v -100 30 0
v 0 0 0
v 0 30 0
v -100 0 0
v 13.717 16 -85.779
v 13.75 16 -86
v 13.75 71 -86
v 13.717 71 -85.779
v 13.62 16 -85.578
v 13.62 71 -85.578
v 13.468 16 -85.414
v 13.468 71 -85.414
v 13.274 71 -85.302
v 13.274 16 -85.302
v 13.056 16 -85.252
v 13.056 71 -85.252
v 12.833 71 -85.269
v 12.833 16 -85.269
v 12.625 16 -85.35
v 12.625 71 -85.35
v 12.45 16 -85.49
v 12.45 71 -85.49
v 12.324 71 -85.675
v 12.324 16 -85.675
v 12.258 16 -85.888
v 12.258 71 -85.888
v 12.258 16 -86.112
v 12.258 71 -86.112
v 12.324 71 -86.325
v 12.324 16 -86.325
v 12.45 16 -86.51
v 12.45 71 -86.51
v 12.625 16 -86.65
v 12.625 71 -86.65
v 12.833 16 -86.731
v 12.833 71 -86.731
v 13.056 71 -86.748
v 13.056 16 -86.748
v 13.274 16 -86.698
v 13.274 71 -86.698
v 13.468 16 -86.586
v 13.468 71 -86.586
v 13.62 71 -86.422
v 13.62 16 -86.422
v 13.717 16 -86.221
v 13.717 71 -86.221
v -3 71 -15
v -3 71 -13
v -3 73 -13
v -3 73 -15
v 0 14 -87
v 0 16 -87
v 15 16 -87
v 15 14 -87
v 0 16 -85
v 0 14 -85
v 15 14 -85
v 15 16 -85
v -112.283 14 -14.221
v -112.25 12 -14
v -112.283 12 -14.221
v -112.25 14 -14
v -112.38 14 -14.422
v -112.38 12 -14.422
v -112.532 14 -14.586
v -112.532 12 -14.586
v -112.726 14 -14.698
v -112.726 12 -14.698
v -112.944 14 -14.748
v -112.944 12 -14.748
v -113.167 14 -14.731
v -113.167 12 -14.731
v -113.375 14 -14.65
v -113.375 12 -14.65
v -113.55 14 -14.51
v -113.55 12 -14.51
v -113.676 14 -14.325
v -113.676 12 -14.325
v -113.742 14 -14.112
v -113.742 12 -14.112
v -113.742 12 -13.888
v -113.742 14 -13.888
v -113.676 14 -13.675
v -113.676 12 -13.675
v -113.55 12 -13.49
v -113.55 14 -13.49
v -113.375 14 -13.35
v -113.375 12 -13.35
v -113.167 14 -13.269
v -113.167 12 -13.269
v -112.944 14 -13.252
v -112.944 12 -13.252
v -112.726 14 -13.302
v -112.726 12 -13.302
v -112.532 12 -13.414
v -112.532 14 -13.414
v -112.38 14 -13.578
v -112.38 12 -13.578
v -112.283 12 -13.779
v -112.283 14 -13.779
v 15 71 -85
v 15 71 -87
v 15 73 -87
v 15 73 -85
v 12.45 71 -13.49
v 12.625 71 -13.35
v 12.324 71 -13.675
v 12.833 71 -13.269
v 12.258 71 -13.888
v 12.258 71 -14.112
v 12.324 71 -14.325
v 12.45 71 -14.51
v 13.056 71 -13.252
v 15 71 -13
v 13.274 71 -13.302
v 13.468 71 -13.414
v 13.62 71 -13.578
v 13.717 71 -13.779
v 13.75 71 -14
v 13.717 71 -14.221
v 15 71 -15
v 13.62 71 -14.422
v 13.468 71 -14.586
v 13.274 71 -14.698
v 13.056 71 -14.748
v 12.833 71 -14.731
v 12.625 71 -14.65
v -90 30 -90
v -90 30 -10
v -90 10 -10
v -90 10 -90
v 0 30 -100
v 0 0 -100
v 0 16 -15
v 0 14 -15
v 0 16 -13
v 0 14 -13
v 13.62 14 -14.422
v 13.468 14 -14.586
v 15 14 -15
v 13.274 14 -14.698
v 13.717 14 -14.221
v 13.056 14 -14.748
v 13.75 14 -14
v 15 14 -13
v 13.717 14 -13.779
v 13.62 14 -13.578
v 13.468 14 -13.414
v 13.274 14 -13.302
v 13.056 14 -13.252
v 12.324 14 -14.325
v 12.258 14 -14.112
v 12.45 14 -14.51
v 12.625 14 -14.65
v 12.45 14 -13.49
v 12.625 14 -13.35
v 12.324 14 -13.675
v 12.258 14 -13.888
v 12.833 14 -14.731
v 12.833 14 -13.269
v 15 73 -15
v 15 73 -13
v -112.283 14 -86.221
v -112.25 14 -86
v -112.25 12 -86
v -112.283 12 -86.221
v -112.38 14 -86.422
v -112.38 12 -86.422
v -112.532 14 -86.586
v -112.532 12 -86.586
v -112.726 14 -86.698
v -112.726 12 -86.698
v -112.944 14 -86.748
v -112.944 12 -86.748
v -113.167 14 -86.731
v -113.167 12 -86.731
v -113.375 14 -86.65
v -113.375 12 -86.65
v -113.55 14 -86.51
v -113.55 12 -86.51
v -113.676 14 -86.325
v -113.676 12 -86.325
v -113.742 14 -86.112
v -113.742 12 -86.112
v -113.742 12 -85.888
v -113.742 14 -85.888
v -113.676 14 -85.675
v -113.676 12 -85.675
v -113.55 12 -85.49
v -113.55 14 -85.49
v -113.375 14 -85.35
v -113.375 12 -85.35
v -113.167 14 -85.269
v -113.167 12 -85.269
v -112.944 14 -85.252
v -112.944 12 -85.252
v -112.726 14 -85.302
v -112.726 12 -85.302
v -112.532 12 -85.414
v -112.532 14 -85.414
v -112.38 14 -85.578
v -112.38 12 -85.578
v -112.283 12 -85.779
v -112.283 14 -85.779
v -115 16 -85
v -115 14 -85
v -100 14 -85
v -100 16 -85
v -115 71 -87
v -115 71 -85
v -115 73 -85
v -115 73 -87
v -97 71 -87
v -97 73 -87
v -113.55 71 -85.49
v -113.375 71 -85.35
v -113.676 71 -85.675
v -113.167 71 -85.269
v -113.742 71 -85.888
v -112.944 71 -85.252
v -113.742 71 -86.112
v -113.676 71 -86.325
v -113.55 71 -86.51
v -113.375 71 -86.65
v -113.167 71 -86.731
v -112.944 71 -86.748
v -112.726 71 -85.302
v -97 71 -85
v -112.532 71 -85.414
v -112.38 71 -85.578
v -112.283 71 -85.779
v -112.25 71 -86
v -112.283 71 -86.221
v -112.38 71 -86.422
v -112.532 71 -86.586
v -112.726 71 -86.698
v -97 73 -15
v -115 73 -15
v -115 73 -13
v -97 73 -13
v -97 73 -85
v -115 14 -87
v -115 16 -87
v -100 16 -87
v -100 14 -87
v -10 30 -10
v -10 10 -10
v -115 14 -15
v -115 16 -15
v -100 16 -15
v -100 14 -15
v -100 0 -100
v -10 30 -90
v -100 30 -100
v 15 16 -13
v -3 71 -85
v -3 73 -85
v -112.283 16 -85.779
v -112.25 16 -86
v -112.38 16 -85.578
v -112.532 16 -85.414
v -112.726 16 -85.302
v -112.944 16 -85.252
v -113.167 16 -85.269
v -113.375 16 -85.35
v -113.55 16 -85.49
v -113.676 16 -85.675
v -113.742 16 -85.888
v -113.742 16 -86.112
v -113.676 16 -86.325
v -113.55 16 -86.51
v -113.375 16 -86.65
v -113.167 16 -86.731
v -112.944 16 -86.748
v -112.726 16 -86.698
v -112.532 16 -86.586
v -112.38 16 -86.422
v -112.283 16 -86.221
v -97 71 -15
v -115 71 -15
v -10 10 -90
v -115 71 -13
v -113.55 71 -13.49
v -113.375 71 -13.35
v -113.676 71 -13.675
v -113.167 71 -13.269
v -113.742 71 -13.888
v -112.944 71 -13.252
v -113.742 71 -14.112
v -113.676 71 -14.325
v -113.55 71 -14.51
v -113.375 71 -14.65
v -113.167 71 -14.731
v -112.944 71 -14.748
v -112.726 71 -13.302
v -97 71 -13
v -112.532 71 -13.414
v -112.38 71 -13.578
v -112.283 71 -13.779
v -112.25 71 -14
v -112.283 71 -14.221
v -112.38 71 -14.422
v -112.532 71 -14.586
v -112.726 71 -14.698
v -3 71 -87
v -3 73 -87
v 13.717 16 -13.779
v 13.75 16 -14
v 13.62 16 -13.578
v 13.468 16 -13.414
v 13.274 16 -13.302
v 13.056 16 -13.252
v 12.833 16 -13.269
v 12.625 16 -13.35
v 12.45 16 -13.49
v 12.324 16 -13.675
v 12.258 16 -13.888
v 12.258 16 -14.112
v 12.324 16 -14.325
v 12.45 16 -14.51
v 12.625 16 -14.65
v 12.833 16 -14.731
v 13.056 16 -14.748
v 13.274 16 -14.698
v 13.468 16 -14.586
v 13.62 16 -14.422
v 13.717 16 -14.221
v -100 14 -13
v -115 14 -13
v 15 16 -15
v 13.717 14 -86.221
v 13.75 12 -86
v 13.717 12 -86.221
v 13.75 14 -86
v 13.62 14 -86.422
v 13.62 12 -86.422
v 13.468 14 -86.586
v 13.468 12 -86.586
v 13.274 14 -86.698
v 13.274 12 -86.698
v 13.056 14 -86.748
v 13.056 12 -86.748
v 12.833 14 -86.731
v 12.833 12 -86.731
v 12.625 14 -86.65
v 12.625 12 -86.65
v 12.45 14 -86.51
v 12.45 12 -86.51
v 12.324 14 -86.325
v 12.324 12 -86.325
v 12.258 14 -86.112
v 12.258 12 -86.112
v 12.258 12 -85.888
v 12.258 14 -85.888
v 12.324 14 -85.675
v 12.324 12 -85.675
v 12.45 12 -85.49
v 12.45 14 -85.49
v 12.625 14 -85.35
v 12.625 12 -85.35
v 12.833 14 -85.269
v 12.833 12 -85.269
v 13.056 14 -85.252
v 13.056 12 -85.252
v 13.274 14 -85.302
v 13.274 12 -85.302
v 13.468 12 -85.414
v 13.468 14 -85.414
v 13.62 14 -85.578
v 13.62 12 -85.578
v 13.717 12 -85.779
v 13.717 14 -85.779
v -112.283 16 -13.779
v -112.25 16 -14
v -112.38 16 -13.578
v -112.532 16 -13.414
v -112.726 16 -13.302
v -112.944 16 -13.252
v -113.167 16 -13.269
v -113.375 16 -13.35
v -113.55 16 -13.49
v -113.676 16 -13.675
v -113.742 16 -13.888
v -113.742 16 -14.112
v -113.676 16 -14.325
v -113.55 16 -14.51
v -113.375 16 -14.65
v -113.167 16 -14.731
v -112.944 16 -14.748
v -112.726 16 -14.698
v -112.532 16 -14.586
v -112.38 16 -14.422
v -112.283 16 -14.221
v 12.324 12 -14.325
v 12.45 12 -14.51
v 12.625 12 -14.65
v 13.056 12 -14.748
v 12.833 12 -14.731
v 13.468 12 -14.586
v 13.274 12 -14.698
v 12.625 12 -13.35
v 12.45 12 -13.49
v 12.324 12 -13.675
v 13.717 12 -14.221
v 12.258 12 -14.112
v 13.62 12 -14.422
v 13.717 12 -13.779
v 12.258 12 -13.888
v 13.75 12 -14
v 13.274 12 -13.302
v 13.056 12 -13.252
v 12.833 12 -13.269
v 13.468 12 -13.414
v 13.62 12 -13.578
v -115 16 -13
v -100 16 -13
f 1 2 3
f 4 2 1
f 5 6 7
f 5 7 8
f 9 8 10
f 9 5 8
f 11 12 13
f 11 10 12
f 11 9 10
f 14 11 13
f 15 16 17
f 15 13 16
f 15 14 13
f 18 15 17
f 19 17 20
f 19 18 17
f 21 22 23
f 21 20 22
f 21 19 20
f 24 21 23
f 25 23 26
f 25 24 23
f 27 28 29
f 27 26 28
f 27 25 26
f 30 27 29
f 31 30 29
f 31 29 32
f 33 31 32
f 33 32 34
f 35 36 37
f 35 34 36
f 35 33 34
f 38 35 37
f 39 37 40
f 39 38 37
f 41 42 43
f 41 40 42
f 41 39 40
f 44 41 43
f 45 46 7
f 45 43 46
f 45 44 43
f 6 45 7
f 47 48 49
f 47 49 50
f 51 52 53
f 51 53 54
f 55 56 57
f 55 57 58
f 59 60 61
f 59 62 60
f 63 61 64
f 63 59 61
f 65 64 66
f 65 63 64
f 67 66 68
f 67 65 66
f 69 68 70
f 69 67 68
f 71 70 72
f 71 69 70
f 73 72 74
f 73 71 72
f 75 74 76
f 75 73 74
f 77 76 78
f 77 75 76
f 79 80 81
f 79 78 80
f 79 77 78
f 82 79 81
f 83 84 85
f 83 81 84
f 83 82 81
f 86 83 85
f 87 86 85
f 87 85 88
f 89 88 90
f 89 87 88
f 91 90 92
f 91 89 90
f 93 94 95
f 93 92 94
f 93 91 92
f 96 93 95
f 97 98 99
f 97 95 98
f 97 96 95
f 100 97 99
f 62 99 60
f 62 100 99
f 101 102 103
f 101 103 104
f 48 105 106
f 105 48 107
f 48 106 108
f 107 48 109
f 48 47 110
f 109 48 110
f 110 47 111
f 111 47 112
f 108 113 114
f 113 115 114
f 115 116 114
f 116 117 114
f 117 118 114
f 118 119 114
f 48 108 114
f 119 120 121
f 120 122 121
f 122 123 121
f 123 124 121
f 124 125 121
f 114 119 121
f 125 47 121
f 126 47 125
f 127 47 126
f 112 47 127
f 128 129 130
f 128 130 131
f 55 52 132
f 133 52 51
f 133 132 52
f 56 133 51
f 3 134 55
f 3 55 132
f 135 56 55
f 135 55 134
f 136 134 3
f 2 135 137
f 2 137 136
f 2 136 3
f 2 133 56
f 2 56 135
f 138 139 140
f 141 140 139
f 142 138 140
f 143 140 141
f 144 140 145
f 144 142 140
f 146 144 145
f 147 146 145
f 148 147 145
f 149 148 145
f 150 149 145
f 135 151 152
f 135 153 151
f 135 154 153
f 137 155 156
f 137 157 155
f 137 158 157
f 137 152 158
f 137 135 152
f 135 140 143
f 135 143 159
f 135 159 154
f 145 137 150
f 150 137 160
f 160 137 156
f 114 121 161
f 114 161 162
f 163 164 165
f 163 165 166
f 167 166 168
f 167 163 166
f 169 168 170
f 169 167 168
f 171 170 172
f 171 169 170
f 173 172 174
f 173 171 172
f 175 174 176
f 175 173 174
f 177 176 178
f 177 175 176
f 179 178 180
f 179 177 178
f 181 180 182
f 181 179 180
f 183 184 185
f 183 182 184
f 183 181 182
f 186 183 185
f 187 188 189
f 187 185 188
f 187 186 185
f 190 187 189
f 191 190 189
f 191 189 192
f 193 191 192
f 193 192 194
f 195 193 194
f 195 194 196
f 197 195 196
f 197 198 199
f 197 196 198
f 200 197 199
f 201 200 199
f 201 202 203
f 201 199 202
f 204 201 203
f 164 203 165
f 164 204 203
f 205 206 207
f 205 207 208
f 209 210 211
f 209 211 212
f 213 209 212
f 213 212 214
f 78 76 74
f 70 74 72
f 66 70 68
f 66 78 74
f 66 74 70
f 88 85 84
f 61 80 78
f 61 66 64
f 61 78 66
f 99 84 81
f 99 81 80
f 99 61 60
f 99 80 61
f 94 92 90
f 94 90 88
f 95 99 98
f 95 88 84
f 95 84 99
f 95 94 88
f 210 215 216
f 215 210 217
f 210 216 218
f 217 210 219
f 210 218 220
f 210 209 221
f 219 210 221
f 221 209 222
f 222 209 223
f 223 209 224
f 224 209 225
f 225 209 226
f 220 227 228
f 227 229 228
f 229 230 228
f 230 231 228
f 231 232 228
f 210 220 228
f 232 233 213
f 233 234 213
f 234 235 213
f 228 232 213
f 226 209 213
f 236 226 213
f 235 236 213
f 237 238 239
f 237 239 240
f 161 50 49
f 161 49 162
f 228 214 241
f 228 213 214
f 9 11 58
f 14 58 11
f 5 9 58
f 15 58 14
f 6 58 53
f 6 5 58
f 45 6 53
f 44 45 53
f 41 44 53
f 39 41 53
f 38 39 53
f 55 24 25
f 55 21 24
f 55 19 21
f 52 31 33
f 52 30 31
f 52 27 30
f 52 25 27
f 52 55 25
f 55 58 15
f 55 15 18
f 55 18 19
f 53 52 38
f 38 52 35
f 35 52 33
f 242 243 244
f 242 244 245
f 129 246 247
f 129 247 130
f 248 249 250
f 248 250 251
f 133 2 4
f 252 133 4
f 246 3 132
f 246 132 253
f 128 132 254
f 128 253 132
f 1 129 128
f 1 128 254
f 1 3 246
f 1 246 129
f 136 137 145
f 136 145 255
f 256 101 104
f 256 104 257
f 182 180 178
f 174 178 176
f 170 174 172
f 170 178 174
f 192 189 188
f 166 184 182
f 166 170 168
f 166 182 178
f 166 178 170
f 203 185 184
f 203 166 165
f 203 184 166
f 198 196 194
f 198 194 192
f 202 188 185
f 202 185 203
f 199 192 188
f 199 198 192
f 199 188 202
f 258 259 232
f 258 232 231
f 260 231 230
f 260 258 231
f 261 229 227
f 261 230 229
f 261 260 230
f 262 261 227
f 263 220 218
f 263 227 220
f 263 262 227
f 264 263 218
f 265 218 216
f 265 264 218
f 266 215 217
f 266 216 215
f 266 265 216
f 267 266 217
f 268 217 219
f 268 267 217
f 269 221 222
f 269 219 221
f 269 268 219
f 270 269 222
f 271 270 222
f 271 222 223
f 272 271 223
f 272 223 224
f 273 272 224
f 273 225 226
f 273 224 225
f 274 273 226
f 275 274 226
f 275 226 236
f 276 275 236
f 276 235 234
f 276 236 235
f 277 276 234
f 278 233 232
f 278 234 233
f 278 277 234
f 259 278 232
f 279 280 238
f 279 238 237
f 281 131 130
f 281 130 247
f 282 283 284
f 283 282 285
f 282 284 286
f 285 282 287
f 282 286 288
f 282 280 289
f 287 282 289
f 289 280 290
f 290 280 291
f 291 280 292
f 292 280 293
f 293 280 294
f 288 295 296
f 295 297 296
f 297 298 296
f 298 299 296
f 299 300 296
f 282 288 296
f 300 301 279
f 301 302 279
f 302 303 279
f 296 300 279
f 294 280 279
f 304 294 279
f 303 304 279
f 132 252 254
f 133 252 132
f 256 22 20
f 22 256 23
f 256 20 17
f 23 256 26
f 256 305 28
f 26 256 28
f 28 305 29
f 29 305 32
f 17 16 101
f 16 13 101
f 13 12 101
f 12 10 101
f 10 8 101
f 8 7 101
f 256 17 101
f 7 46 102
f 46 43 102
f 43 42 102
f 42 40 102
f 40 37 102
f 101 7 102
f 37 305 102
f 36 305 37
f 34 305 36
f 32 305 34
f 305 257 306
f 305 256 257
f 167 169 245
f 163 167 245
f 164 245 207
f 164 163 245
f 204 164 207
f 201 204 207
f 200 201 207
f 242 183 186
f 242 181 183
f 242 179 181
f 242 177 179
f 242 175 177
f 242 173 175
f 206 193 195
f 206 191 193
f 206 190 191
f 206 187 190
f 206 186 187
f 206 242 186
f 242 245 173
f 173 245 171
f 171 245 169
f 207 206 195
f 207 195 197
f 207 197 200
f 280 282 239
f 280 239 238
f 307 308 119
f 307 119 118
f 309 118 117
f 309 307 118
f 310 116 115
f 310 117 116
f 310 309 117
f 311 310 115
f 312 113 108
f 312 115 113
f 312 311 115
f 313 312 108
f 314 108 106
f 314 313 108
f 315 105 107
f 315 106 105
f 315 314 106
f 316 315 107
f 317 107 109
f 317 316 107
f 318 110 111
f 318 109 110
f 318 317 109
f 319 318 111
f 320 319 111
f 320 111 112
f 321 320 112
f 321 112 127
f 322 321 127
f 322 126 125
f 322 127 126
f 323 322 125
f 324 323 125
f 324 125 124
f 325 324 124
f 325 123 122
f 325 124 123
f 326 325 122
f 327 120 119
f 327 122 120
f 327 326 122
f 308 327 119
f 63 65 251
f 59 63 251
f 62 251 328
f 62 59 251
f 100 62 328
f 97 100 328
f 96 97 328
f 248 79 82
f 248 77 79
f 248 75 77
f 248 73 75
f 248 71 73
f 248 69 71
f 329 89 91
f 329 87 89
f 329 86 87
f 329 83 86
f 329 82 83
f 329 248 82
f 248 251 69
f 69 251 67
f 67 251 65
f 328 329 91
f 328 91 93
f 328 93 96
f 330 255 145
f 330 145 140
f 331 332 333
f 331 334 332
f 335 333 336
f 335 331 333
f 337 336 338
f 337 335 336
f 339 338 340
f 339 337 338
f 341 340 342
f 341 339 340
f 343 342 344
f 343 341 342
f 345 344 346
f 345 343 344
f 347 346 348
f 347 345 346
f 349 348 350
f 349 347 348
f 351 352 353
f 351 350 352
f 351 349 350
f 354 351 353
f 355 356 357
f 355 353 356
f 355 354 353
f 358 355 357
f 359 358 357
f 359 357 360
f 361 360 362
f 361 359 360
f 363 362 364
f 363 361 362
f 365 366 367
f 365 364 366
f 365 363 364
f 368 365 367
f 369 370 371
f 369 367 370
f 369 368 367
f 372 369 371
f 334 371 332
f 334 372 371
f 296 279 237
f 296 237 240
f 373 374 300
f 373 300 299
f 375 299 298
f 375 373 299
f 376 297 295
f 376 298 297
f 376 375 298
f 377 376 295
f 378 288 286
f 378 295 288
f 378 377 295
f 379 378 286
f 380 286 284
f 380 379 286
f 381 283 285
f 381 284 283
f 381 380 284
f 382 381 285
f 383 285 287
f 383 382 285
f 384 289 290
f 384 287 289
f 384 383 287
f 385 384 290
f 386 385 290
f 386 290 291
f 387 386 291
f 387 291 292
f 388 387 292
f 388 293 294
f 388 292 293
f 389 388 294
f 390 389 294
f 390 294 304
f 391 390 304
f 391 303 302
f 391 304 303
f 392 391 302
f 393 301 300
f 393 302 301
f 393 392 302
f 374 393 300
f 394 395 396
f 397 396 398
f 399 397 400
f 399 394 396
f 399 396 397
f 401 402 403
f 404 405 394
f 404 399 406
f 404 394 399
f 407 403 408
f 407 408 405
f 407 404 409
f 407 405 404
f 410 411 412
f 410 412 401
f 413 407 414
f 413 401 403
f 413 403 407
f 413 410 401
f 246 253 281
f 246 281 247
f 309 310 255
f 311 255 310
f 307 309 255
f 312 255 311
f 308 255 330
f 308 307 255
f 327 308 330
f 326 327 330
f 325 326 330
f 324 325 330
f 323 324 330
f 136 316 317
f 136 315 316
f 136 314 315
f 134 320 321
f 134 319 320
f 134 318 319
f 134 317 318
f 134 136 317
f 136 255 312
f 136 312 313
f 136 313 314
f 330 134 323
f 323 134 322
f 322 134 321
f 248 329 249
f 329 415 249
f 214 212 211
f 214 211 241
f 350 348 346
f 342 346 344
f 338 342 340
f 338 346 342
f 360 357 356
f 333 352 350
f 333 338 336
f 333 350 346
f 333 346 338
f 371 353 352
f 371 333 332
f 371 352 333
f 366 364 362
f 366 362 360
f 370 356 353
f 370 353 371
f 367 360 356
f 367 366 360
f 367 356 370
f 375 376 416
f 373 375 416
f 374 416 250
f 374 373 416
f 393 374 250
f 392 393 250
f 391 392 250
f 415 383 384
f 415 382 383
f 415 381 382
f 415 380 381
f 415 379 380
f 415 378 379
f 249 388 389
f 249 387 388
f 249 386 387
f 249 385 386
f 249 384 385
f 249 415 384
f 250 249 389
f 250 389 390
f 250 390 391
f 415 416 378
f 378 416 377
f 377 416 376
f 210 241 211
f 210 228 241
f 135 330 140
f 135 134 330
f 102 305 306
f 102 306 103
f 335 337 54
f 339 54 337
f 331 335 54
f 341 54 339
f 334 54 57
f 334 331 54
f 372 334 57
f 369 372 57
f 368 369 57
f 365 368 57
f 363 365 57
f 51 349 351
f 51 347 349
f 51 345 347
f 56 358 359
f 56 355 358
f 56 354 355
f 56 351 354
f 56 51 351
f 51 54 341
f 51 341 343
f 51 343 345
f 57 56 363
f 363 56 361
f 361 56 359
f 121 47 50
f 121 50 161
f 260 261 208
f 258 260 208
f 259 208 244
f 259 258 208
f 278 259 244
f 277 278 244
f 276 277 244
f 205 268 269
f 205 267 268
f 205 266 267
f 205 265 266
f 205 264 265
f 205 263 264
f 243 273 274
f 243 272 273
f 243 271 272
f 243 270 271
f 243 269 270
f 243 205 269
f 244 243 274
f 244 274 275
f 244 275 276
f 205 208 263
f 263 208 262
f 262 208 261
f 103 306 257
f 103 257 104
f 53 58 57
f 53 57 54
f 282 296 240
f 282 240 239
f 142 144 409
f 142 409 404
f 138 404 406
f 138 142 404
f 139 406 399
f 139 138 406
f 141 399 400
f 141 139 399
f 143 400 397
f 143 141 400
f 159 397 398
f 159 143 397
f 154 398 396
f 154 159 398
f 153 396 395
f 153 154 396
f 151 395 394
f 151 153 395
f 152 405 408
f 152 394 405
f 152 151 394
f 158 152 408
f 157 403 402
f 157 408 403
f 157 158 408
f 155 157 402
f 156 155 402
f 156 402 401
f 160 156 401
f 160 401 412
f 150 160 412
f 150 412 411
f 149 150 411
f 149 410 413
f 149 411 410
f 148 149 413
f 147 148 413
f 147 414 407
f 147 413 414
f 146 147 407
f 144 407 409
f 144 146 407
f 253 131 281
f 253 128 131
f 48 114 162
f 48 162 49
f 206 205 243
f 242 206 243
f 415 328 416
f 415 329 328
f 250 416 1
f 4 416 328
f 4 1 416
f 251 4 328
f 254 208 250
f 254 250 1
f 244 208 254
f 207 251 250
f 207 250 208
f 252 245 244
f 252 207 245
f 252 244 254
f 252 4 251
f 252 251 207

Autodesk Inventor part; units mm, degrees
ref_plane "YZ Plane" through (0, 0, 0) normal (1, 0, 0) x (0, 1, 0)
ref_plane "XZ Plane" through (0, 0, 0) normal (0, 1, 0) x (-1, 0, 0)
ref_plane "XY Plane" through (0, 0, 0) normal (0, 0, 1) x (1, 0, 0)
sketch "Sketch1" plane through (0, 0, 0) normal (0, 1, 0) x (-1, 0, 0)
  line L0 (0, 0) -> (100, 0)
  line L1 (100, 0) -> (100, -100)
  line L2 (100, -100) -> (0, -100)
  line L3 (0, -100) -> (0, 0)
  dimension "d0" = 100
  dimension "d1" = 100
extrude "Extrusion1" add sketch "Sketch1" along normal blind 30
sketch "Sketch2" plane through (0, 30, 0) normal (0, 1, 0) x (1, 0, 0)
  line L0 (0, 0) -> (0, 100) projected
  line L1 (-100, 0) -> (0, 0) projected
  line L2 (0, 10) -> (0, 0)
  line L3 (-10, 10) -> (-90, 10)
  line L4 (-90, 10) -> (-90, 90)
  line L5 (-90, 90) -> (-10, 90)
  line L6 (-10, 90) -> (-10, 10)
  dimension "d6" = 80
  dimension "d7" = 80
extrude "Extrusion2" cut sketch "Sketch2" against normal blind 20
sketch "Sketch5" plane through (0, 0, 0) normal (1, 0, 0) x (0, 0, -1)
  point P0 (0, 0)
sketch "Sketch6" plane through (0, 0, 0) normal (1, 0, 0) x (0, 0, -1)
  line L0 (13, 16) -> (15, 16)
  line L1 (15, 16) -> (15, 14)
  line L2 (15, 14) -> (13, 14)
  line L3 (13, 14) -> (13, 16)
  line L4 (13, 16) -> (15, 14) construction
  line L5 (15, 16) -> (13, 14) construction
  line L6 (85, 16) -> (87, 16)
  line L7 (87, 16) -> (87, 14)
  line L8 (87, 14) -> (85, 14)
  line L9 (85, 14) -> (85, 16)
  line L10 (85, 16) -> (87, 14) construction
  line L11 (87, 16) -> (85, 14) construction
  point P0 (0, 0)
  point P1 (14, 15)
  point P2 (86, 15)
  dimension "d22" = 2
  dimension "d23" = 2
  dimension "d24" = 2
  dimension "d25" = 2
extrude "Extrusion5" add sketch "Sketch6" along normal blind 15
pattern_linear "Rectangular Pattern1" count 2 spacing 115 along (-1, 0, 0) of "Extrusion5"
sketch "Sketch7" plane through (0, 16, -85) normal (0, 1, 0) x (1, 0, 0)
  circle A0 centre (13, 1) radius 0.75
  point P0 (0, -85)
  dimension "d31" = 1.5
extrude "Extrusion6" add sketch "Sketch7" along normal blind 55
sketch "Sketch8" plane through (0, 14, -87) normal (0, -1, 0) x (1, 0, 0)
  circle A0 centre (13, 1) radius 0.75 projected
  circle A1 centre (13, 1) radius 0.75
  point P0 (0, 87)
  dimension "d34" = 1.5
extrude "Extrusion7" add sketch "Sketch8" along normal blind 2
thread "Thread1" size "M1.6x0.35" class "6g" standard "ANSI Metric M Profile" full length
pattern_linear "Rectangular Pattern2" count 2 spacing 72 along (0, 0, 1) of "Extrusion6"
pattern_linear "Rectangular Pattern3" count 2 spacing 126 along (-1, 0, 0) of "Extrusion6", "Rectangular Pattern2"
thread "Thread2" size "M1.6x0.35" class "6g" standard "ANSI Metric M Profile" full length
thread "Thread3" size "M1.6x0.35" class "6g" standard "ANSI Metric M Profile" full length
thread "Thread4" size "M1.6x0.35" class "6g" standard "ANSI Metric M Profile" full length
pattern_linear "Rectangular Pattern4" count 2 spacing 72 along (0, 0, 1) count 2 spacing 126 along (-1, 0, 0) of "Extrusion7"
thread "Thread5" size "M1.6x0.35" class "6g" standard "ANSI Metric M Profile" full length
thread "Thread6" size "M1.6x0.35" class "6g" standard "ANSI Metric M Profile" full length
thread "Thread7" size "M1.6x0.35" class "6g" standard "ANSI Metric M Profile" full length
sketch "Sketch9" plane through (-100, 0, -100) normal (-1, 0, 0) x (0, 0, 1)
  point P0 (100, 0)
sketch "Sketch10" plane through (-113, 71, -14) normal (0, 1, 0) x (1, 0, 0)
  point P0 (113, -14)
sketch "Sketch11" plane through (-113, 71, -86) normal (0, 1, 0) x (1, 0, 0)
  line L0 (-2, -1) -> (-2, 1) projected
  line L1 (-2, 1) -> (16, 1)
  line L2 (16, 1) -> (16, -1)
  line L3 (16, -1) -> (-2, -1)
  line L4 (-2, -1) -> (-2, 1)
  point P0 (113, -86)
  dimension "d63" = 18
extrude "Extrusion8" add sketch "Sketch11" along normal blind 2
sketch "Sketch12" plane through (-113, 73, -86) normal (0, 1, 0) x (1, 0, 0)
  point P0 (113, -86)
sketch "Sketch13" plane through (13, 71, -86) normal (0, 1, 0) x (1, 0, 0)
  line L0 (-13, -1) -> (2, -1) projected
  line L1 (2, -1) -> (-16, -1)
  line L2 (-16, -1) -> (-16, 1)
  line L3 (-16, 1) -> (2, 1)
  line L4 (2, 1) -> (2, -1)
  point P0 (-13, -86)
  dimension "d66" = 18
  dimension "d67" = 2
extrude "Extrusion9" add sketch "Sketch13" along normal blind 2
pattern_linear "Rectangular Pattern5" count 2 spacing 72 along (0, 0, 1) of "Extrusion9"
pattern_linear "Rectangular Pattern6" count 2 spacing 72 along (0, 0, 1) of "Extrusion8"
properties part number "container 1" material "Silver"
